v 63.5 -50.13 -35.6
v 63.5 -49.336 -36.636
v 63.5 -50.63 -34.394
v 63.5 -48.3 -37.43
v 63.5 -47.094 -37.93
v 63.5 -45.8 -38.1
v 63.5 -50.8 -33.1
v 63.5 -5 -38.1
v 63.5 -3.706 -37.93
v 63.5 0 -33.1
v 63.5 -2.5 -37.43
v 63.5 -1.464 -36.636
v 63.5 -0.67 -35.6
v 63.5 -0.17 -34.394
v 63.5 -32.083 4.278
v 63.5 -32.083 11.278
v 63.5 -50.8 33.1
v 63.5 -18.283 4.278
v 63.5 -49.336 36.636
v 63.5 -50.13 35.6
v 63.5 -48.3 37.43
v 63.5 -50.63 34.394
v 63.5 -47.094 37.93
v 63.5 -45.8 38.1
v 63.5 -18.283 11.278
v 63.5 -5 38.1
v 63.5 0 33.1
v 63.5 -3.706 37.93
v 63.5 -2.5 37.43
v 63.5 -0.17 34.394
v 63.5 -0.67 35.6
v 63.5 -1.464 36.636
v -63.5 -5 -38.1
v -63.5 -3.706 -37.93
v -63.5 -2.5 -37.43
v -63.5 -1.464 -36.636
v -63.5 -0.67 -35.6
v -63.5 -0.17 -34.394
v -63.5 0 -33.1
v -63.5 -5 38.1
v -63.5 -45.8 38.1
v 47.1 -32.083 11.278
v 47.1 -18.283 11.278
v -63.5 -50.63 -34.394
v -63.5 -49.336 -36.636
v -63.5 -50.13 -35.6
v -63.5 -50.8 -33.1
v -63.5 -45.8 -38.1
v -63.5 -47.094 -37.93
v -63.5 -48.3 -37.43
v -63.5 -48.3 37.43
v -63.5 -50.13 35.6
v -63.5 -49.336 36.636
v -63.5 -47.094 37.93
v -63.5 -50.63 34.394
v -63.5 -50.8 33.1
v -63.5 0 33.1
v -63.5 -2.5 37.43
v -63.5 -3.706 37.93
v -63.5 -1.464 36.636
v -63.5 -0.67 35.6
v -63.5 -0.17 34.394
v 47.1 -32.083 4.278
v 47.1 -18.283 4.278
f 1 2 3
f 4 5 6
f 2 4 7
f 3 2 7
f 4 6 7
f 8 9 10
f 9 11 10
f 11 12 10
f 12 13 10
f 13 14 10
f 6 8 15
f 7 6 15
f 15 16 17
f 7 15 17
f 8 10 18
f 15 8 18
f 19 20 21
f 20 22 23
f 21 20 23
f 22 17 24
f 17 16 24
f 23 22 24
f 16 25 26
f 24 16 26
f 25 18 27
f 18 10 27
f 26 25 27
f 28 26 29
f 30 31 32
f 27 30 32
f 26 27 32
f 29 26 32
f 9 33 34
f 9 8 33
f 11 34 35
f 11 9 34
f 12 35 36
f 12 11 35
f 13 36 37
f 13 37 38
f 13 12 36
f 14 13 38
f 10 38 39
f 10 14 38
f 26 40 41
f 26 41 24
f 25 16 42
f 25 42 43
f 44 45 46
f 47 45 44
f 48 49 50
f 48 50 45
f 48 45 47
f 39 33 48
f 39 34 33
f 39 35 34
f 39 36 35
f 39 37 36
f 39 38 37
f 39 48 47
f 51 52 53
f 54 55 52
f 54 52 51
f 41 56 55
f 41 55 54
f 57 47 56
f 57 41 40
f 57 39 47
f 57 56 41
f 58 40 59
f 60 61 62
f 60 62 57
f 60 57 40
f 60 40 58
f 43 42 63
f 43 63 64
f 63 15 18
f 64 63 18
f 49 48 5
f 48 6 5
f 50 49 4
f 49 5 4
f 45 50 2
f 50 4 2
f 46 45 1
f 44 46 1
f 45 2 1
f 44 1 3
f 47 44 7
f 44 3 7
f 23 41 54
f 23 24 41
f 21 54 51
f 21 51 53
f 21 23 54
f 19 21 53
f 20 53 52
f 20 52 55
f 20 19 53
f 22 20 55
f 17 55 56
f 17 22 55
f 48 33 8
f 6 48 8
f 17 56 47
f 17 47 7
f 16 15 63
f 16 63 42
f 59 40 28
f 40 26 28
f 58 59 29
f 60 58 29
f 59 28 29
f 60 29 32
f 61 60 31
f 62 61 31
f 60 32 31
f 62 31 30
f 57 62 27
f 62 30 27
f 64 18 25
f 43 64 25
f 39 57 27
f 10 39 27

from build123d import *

# Parameters (mm, degrees)
F0_W     = 127
F0_H     = 76.2
F1_DEPTH = 50.8
F2_R     = 5
F3_W     = 13.8
F3_H     = 7
F4_DEPTH = 16.4


with BuildPart() as f1:
    # F0 (on Front) → F1 (new body)
    with BuildSketch(Plane.XZ):
        Rectangle(F0_W, F0_H)
    extrude(amount=F1_DEPTH)

    # F2
    f2_edges = [f1.edges().sort_by_distance(p)[0] for p in [
        (0, -50.8, 38.1),
        (0, 0, 38.1),
        (0, 0, -38.1),
        (0, -50.8, -38.1),
    ]]
    fillet(f2_edges, radius=F2_R)

    # F3 (on face) → F4 (cut)
    with BuildSketch(Plane.YZ.offset(63.5)):
        with Locations((-25.183004, 7.778266)):
            Rectangle(F3_W, F3_H)
    extrude(amount=-F4_DEPTH, mode=Mode.SUBTRACT)


solid = f1.part
